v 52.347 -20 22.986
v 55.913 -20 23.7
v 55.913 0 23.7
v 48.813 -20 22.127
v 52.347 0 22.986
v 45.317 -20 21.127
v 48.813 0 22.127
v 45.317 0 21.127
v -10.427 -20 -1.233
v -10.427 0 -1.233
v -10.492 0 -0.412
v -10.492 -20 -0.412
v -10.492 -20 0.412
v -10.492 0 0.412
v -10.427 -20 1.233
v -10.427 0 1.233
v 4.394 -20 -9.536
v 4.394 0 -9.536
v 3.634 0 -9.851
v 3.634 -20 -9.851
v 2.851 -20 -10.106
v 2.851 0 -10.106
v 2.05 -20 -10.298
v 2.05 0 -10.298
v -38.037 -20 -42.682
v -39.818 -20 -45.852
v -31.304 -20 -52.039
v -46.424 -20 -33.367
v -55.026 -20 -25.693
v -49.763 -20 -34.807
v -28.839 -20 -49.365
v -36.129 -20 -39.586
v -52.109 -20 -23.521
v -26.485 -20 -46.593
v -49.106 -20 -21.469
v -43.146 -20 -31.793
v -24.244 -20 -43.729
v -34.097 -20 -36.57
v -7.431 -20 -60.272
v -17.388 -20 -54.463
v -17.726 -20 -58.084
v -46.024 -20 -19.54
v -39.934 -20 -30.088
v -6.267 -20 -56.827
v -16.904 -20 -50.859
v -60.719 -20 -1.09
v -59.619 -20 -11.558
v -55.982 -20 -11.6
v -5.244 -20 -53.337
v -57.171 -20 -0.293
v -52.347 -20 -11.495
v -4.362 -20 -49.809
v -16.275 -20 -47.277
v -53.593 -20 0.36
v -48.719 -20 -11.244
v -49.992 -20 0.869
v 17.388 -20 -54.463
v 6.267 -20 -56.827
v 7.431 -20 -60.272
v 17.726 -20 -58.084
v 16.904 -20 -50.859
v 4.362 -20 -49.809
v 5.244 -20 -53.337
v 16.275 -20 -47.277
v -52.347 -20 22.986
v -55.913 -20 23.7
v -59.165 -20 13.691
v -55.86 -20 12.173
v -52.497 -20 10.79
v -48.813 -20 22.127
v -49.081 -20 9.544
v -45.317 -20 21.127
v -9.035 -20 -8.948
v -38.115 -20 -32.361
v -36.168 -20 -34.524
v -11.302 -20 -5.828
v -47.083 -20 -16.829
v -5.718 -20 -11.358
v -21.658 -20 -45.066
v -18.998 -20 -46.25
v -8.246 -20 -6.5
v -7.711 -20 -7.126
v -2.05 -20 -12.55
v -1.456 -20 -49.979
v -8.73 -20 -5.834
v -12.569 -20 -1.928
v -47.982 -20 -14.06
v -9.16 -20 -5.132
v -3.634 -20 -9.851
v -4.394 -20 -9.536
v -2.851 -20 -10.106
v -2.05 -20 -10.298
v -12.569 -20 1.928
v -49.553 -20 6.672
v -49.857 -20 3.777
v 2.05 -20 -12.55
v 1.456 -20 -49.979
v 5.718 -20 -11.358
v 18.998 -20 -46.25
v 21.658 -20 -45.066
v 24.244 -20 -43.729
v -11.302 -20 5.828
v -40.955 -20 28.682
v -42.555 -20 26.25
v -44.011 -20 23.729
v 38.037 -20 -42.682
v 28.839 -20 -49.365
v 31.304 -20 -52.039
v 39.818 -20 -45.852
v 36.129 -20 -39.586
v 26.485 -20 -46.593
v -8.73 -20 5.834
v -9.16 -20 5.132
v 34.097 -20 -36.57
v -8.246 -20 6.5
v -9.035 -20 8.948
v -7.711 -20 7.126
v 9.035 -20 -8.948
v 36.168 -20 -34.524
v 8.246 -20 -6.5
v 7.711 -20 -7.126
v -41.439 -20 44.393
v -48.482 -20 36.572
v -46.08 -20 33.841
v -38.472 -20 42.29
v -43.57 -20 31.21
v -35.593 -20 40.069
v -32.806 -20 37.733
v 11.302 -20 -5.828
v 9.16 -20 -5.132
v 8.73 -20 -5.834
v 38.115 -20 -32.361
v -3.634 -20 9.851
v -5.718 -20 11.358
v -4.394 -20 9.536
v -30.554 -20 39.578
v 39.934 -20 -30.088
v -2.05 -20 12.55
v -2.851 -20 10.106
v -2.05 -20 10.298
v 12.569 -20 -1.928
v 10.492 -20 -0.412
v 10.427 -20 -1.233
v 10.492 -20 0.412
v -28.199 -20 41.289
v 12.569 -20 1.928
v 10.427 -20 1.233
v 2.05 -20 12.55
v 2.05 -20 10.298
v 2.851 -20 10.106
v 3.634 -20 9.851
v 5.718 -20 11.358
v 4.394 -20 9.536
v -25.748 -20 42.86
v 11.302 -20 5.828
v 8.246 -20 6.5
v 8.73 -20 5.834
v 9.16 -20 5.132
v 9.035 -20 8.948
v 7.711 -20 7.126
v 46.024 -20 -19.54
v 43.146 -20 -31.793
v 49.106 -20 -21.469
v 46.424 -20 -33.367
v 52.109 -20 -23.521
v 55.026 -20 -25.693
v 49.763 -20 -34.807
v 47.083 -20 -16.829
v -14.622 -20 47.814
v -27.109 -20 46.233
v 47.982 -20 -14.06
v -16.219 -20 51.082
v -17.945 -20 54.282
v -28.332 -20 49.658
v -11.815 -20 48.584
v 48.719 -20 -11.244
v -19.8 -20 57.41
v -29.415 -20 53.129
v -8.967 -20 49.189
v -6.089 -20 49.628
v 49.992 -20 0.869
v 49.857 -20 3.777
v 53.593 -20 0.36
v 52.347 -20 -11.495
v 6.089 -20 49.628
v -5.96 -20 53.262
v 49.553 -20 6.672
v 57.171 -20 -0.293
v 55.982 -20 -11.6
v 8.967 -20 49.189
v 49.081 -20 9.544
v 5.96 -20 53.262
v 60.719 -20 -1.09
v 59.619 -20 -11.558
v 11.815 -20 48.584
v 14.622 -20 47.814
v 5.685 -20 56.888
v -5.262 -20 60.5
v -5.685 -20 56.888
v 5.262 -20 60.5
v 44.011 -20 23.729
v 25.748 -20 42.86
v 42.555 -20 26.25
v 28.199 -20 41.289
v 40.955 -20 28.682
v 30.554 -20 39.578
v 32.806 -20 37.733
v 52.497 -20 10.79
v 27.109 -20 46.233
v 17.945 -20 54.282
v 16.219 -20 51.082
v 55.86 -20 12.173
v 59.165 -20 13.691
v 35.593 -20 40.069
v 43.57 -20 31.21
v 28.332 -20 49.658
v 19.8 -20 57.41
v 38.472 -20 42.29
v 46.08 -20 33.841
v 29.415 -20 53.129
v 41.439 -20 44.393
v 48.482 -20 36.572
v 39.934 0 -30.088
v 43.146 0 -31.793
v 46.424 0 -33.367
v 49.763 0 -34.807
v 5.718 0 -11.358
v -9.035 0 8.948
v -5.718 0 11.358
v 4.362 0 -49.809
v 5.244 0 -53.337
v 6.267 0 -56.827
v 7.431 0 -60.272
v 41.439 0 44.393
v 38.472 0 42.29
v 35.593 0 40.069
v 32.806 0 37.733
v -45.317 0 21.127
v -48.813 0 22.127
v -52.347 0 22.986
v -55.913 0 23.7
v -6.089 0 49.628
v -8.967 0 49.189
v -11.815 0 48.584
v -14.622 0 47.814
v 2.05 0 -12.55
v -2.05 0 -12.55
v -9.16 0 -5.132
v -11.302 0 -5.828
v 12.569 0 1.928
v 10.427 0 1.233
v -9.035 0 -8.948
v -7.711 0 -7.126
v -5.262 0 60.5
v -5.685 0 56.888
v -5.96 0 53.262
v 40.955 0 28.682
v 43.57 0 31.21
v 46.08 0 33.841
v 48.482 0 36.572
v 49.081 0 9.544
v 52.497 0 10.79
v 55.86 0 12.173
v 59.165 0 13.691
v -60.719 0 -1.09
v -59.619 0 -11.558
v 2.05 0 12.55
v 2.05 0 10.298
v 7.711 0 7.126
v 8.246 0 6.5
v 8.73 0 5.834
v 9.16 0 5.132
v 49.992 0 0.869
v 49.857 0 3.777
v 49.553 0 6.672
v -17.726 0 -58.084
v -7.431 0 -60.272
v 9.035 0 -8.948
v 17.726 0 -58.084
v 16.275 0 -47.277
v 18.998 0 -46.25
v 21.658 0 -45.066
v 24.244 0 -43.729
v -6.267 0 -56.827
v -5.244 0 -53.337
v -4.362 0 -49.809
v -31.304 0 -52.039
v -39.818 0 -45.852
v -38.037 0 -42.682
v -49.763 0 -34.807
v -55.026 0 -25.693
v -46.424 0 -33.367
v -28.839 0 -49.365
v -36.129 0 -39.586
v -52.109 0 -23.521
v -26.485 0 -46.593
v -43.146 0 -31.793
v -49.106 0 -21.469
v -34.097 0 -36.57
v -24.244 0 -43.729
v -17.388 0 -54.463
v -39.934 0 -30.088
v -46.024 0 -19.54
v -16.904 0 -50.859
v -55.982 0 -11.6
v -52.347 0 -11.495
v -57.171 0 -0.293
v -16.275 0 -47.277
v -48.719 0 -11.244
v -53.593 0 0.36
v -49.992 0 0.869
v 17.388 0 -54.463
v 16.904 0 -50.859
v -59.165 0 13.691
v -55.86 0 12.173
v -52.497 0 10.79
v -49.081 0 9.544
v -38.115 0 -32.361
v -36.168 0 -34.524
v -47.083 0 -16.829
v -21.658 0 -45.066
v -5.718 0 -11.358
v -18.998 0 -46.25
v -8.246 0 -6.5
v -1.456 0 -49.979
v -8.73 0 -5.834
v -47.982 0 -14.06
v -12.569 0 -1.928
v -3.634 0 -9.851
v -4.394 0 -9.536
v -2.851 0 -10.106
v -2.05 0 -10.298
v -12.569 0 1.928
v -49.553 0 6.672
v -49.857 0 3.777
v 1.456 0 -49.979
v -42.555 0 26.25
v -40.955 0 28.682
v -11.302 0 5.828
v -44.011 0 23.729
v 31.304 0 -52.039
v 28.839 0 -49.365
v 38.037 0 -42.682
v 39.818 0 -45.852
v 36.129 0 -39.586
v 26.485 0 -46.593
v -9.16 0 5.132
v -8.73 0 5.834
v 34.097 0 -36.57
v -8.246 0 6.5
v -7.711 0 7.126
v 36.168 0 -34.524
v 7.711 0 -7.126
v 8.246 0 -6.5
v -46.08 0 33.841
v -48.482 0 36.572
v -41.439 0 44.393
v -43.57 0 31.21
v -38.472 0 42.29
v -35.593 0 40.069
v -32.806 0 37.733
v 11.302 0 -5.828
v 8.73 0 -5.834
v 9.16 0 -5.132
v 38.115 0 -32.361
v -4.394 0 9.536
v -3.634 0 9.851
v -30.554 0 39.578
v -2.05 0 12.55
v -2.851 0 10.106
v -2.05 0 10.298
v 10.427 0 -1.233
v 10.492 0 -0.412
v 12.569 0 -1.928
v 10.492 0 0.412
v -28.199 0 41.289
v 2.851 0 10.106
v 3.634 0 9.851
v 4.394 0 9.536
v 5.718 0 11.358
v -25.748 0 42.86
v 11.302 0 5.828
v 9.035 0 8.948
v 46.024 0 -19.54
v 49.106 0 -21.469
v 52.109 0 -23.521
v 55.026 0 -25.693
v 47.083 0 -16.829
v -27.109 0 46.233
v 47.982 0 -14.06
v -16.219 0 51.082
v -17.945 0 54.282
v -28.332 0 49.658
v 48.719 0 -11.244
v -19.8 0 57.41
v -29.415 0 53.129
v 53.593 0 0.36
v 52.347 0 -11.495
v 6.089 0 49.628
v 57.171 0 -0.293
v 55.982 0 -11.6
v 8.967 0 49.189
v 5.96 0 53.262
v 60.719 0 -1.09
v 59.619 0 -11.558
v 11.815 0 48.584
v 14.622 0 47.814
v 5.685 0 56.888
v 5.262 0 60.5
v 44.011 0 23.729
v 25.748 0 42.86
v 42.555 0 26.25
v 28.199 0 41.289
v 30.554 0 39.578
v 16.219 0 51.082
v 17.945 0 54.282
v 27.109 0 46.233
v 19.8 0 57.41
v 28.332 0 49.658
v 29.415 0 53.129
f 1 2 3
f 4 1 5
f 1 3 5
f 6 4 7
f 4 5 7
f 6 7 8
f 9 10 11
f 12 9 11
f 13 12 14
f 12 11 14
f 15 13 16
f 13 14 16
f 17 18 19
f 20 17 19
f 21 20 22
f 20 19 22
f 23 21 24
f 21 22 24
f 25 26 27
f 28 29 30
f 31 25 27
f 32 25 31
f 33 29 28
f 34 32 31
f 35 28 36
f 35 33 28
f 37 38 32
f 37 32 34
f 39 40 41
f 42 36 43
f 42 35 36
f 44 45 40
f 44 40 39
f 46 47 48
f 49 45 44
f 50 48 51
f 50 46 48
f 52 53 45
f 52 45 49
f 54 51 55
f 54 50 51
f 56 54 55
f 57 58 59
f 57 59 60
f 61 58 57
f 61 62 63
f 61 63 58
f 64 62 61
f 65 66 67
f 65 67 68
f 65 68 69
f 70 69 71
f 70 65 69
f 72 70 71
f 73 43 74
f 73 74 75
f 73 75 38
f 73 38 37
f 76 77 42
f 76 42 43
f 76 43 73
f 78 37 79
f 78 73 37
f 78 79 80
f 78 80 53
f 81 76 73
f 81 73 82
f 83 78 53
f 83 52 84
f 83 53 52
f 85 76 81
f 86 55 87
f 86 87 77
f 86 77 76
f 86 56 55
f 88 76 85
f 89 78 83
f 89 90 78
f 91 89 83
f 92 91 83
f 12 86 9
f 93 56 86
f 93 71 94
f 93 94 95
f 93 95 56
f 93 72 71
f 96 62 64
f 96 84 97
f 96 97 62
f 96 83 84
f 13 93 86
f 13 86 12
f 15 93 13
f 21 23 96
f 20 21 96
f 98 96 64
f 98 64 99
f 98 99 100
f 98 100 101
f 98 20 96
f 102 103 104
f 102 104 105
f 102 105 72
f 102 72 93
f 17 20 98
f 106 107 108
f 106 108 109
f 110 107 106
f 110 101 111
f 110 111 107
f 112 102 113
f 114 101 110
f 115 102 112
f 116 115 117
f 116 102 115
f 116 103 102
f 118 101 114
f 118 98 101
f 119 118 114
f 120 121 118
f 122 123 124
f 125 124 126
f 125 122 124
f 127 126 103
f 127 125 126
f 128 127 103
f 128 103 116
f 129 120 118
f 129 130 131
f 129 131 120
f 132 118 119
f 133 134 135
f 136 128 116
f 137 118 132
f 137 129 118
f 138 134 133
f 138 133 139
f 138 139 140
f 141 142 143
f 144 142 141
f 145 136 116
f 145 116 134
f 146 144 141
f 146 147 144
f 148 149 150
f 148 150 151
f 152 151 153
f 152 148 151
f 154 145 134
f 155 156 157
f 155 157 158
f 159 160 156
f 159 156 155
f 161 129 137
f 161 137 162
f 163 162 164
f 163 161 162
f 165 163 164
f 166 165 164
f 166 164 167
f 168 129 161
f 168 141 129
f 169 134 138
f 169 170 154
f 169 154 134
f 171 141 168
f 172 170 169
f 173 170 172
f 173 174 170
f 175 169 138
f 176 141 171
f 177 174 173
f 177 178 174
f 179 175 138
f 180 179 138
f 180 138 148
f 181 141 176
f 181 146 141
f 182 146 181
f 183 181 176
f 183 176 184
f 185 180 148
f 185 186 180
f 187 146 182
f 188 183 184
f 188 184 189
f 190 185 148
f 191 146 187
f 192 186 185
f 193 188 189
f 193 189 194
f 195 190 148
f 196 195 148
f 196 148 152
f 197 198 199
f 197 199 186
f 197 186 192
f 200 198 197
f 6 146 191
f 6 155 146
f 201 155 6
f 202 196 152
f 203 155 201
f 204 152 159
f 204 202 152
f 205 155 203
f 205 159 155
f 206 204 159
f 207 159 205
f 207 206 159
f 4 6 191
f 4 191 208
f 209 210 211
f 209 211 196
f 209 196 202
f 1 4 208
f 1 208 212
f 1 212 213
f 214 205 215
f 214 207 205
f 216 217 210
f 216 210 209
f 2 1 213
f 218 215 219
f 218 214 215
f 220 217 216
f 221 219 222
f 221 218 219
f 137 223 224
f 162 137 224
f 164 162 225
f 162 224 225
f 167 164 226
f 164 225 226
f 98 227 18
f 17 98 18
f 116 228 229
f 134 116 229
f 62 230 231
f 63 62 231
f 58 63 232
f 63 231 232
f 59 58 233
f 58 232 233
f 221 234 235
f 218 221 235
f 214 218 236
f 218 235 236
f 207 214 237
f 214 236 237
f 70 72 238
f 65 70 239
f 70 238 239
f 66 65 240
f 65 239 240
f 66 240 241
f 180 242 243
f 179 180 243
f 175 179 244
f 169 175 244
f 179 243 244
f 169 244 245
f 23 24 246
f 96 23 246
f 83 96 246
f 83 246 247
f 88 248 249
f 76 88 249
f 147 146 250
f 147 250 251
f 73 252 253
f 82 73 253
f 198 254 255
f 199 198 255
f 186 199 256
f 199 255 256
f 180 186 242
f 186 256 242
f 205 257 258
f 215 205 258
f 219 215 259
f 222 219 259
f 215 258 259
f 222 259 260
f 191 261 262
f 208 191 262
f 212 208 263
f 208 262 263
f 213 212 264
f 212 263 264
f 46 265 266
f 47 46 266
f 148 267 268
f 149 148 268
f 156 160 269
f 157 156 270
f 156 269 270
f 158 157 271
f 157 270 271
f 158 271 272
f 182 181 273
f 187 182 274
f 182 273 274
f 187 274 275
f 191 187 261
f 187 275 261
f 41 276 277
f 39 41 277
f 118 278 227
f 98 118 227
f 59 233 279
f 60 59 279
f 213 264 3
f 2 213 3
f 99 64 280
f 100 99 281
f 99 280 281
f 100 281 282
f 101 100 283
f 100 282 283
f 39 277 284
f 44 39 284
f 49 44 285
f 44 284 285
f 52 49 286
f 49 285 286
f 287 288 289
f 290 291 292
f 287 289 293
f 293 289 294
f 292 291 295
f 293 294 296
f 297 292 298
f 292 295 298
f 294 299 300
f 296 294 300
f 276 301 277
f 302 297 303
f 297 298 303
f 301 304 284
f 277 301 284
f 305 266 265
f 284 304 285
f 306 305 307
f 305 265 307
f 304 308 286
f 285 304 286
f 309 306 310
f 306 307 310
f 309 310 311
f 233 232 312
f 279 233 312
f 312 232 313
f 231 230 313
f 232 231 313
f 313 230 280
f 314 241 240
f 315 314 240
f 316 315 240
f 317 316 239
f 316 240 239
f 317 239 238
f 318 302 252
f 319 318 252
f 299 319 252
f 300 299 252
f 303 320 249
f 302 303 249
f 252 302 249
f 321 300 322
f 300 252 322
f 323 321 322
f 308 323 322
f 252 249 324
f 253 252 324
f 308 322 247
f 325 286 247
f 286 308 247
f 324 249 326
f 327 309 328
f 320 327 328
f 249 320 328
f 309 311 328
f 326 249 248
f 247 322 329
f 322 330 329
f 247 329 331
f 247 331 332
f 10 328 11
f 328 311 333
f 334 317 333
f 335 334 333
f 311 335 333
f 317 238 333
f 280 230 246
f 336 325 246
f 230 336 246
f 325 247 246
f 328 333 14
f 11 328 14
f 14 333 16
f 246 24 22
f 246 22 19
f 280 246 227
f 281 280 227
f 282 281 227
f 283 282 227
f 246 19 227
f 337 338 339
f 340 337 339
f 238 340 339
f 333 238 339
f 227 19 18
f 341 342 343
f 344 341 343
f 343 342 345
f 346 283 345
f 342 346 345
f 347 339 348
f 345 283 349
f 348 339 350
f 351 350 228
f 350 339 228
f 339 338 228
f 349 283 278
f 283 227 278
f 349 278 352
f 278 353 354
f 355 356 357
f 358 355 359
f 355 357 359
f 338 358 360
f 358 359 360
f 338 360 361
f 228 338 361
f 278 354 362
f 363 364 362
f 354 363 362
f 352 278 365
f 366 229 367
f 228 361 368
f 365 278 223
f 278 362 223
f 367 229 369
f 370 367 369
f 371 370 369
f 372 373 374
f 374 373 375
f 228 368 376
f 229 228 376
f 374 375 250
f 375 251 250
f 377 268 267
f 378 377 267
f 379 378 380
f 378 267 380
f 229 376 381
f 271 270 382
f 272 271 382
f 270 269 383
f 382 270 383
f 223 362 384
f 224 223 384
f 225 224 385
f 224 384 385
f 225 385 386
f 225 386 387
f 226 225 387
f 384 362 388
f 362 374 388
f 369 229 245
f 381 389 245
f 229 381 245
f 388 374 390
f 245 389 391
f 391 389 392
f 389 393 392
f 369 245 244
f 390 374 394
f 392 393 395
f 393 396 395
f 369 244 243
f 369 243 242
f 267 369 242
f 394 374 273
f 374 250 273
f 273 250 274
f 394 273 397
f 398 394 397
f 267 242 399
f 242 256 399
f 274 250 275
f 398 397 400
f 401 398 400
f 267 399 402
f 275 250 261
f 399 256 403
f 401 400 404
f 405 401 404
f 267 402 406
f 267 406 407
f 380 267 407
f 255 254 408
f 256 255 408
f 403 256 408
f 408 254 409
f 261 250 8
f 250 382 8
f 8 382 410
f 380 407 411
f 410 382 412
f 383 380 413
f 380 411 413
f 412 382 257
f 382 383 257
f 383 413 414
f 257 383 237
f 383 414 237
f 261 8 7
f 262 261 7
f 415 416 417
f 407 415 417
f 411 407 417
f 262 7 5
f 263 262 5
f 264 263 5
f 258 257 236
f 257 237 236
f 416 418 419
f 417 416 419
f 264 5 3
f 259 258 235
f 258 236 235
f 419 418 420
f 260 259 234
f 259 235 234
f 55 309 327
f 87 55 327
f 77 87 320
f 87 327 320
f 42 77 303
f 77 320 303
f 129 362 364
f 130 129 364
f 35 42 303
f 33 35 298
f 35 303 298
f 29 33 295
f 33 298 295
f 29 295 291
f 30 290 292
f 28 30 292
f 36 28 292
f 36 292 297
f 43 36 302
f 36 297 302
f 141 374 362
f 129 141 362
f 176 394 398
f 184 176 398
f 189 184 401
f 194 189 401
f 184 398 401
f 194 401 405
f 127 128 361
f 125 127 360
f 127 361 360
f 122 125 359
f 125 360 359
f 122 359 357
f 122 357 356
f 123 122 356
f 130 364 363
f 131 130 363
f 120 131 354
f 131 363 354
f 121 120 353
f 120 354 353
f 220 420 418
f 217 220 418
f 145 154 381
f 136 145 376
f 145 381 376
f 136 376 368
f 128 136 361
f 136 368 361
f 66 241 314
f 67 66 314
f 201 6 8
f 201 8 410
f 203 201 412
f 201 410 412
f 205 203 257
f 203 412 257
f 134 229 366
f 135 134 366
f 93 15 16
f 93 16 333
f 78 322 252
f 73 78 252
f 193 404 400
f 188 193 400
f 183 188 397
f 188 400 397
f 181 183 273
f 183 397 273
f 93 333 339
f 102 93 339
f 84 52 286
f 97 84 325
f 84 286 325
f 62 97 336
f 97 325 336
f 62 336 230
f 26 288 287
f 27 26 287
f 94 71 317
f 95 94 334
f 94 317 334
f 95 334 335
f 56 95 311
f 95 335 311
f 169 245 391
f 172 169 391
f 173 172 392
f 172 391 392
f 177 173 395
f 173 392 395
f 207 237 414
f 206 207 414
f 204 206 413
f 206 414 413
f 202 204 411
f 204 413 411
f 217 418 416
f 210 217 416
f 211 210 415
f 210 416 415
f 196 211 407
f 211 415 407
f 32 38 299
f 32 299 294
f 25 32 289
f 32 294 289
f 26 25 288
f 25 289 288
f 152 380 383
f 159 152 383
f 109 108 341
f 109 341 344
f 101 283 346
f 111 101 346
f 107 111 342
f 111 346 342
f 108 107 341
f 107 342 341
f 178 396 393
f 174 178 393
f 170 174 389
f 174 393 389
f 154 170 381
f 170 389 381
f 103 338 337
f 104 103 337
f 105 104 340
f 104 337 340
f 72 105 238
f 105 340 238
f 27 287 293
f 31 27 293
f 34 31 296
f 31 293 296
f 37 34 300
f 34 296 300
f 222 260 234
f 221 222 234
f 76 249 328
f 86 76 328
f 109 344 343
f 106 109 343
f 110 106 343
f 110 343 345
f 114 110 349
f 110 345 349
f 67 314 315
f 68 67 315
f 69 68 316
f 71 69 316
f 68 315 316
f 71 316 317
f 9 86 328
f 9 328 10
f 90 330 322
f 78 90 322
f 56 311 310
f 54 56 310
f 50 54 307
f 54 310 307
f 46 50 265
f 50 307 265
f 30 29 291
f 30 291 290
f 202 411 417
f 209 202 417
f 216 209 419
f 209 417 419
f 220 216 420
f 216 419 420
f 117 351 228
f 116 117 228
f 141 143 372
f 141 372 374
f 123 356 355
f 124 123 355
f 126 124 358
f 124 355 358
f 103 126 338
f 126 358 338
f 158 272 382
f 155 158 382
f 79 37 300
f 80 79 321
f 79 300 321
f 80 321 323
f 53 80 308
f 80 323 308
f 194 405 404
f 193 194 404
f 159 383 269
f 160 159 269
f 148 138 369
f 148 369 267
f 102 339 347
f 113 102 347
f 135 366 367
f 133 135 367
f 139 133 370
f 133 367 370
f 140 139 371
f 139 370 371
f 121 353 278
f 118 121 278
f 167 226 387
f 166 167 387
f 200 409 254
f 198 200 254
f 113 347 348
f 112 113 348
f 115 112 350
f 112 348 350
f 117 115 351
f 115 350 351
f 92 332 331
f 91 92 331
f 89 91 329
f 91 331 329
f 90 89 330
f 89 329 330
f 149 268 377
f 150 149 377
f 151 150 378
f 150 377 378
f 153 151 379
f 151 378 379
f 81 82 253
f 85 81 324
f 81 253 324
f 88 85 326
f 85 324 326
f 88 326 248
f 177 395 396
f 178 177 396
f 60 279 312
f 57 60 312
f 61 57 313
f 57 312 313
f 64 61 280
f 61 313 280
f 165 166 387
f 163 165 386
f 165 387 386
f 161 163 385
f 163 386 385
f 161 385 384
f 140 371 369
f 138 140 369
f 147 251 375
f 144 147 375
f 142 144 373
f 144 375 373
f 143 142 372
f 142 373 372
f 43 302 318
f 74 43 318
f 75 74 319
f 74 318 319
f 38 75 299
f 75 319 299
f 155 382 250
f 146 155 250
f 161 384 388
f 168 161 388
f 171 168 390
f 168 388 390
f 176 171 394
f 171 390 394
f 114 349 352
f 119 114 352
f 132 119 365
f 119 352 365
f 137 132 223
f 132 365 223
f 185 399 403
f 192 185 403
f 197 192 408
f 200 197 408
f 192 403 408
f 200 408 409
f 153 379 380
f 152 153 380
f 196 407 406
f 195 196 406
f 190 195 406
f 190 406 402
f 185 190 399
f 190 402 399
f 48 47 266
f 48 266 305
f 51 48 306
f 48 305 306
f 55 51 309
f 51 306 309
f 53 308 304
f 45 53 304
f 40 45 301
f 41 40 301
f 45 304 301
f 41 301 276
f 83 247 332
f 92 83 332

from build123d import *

# Parameters (mm, degrees)
F1_DEPTH = 20


with BuildPart() as f1:
    # F0 (on Front) → F1 (new body)
    with BuildSketch(Plane.XZ):
        with BuildLine():
            ThreePointArc((-48.48151, 36.57166), (-44.837984, 32.512816), (-40.955282, 28.682135))
            ThreePointArc((-40.955282, 28.682135), (-43.30127, 25), (-45.317098, 21.127248))
            ThreePointArc((-45.317098, 21.127248), (-50.575917, 22.574425), (-55.912741, 23.700389))
            Line((-55.912741, 23.700389), (-59.165097, 13.690667))
            ThreePointArc((-59.165097, 13.690667), (-54.18569, 11.464684), (-49.080587, 9.54442))
            ThreePointArc((-49.080587, 9.54442), (-49.726095, 5.226423), (-49.992455, 0.868577))
            ThreePointArc((-49.992455, 0.868577), (-55.385245, 0.051685), (-60.718648, -1.090378))
            Line((-60.718648, -1.090378), (-59.618502, -11.557566))
            ThreePointArc((-59.618502, -11.557566), (-54.164198, -11.565795), (-48.719413, -11.243612))
            ThreePointArc((-48.719413, -11.243612), (-47.552826, -15.45085), (-46.023662, -19.540279))
            ThreePointArc((-46.023662, -19.540279), (-50.617961, -22.479992), (-55.025748, -25.692609))
            Line((-55.025748, -25.692609), (-49.763326, -34.807391))
            ThreePointArc((-49.763326, -34.807391), (-44.777225, -32.596444), (-39.934209, -30.087521))
            ThreePointArc((-39.934209, -30.087521), (-37.157241, -33.45653), (-34.09696, -36.570443))
            ThreePointArc((-34.09696, -36.570443), (-37.098372, -41.124674), (-39.818397, -45.852354))
            Line((-39.818397, -45.852354), (-31.303619, -52.038702))
            ThreePointArc((-31.303619, -52.038702), (-27.647862, -47.990872), (-24.244018, -43.729025))
            ThreePointArc((-24.244018, -43.729025), (-20.336832, -45.677273), (-16.274584, -47.277245))
            ThreePointArc((-16.274584, -47.277245), (-17.164137, -52.658526), (-17.726083, -58.083811))
            Line((-17.726083, -58.083811), (-7.431232, -60.272049))
            ThreePointArc((-7.431232, -60.272049), (-5.737933, -55.087241), (-4.361816, -49.809382))
            ThreePointArc((-4.361816, -49.809382), (0, -50), (4.361816, -49.809382))
            ThreePointArc((4.361816, -49.809382), (5.737933, -55.087241), (7.431232, -60.272049))
            Line((7.431232, -60.272049), (17.726083, -58.083811))
            ThreePointArc((17.726083, -58.083811), (17.164137, -52.658526), (16.274584, -47.277245))
            ThreePointArc((16.274584, -47.277245), (20.336832, -45.677273), (24.244018, -43.729025))
            ThreePointArc((24.244018, -43.729025), (27.647862, -47.990872), (31.303619, -52.038702))
            Line((31.303619, -52.038702), (39.818397, -45.852354))
            ThreePointArc((39.818397, -45.852354), (37.098372, -41.124674), (34.09696, -36.570443))
            ThreePointArc((34.09696, -36.570443), (37.157241, -33.45653), (39.934209, -30.087521))
            ThreePointArc((39.934209, -30.087521), (44.777225, -32.596444), (49.763326, -34.807391))
            Line((49.763326, -34.807391), (55.025748, -25.692609))
            ThreePointArc((55.025748, -25.692609), (50.617961, -22.479992), (46.023662, -19.540279))
            ThreePointArc((46.023662, -19.540279), (47.552826, -15.45085), (48.719413, -11.243612))
            ThreePointArc((48.719413, -11.243612), (54.164198, -11.565795), (59.618502, -11.557566))
            Line((59.618502, -11.557566), (60.718648, -1.090378))
            ThreePointArc((60.718648, -1.090378), (55.385245, 0.051685), (49.992455, 0.868577))
            ThreePointArc((49.992455, 0.868577), (49.726095, 5.226423), (49.080587, 9.54442))
            ThreePointArc((49.080587, 9.54442), (54.18569, 11.464684), (59.165097, 13.690667))
            Line((59.165097, 13.690667), (55.912741, 23.700389))
            ThreePointArc((55.912741, 23.700389), (50.575917, 22.574425), (45.317098, 21.127248))
            ThreePointArc((45.317098, 21.127248), (43.30127, 25), (40.955282, 28.682135))
            ThreePointArc((40.955282, 28.682135), (44.837984, 32.512816), (48.48151, 36.57166))
            Line((48.48151, 36.57166), (41.439014, 44.393143))
            ThreePointArc((41.439014, 44.393143), (37.021553, 41.193842), (32.806004, 37.732826))
            ThreePointArc((32.806004, 37.732826), (29.389263, 40.45085), (25.748437, 42.860448))
            ThreePointArc((25.748437, 42.860448), (27.737383, 47.939187), (29.415029, 53.12908))
            Line((29.415029, 53.12908), (19.800105, 57.40992))
            ThreePointArc((19.800105, 57.40992), (17.065827, 52.69047), (14.622453, 47.814055))
            ThreePointArc((14.622453, 47.814055), (10.395585, 48.90738), (6.089453, 49.6278))
            ThreePointArc((6.089453, 49.6278), (5.840736, 55.076436), (5.262422, 60.5))
            Line((5.262422, 60.5), (-5.262422, 60.5))
            ThreePointArc((-5.262422, 60.5), (-5.840736, 55.076436), (-6.089453, 49.6278))
            ThreePointArc((-6.089453, 49.6278), (-10.395585, 48.90738), (-14.622453, 47.814055))
            ThreePointArc((-14.622453, 47.814055), (-17.065827, 52.69047), (-19.800105, 57.40992))
            Line((-19.800105, 57.40992), (-29.415029, 53.12908))
            ThreePointArc((-29.415029, 53.12908), (-27.737383, 47.939187), (-25.748437, 42.860448))
            ThreePointArc((-25.748437, 42.860448), (-29.389263, 40.45085), (-32.806004, 37.732826))
            ThreePointArc((-32.806004, 37.732826), (-37.021553, 41.193842), (-41.439014, 44.393143))
            Line((-41.439014, 44.393143), (-48.48151, 36.57166))
        make_face()
        with BuildLine():
            ThreePointArc((-2.05, -10.297937), (-3.244678, -9.986093), (-4.39449, -9.536166))
            Line((-4.39449, -9.536166), (-5.71822, -11.358123))
            Line((-5.71822, -11.358123), (-9.03519, -8.948204))
            Line((-9.03519, -8.948204), (-7.71146, -7.126246))
            ThreePointArc((-7.71146, -7.126246), (-8.494678, -6.171745), (-9.160435, -5.131903))
            Line((-9.160435, -5.131903), (-11.302274, -5.827829))
            Line((-11.302274, -5.827829), (-12.569244, -1.928497))
            Line((-12.569244, -1.928497), (-10.427405, -1.232572))
            ThreePointArc((-10.427405, -1.232572), (-10.5, 0), (-10.427405, 1.232572))
            Line((-10.427405, 1.232572), (-12.569244, 1.928497))
            Line((-12.569244, 1.928497), (-11.302274, 5.827829))
            Line((-11.302274, 5.827829), (-9.160435, 5.131903))
            ThreePointArc((-9.160435, 5.131903), (-8.494678, 6.171745), (-7.71146, 7.126246))
            Line((-7.71146, 7.126246), (-9.03519, 8.948204))
            Line((-9.03519, 8.948204), (-5.71822, 11.358123))
            Line((-5.71822, 11.358123), (-4.39449, 9.536166))
            ThreePointArc((-4.39449, 9.536166), (-3.244678, 9.986093), (-2.05, 10.297937))
            Line((-2.05, 10.297937), (-2.05, 12.55))
            Line((-2.05, 12.55), (2.05, 12.55))
            Line((2.05, 12.55), (2.05, 10.297937))
            ThreePointArc((2.05, 10.297937), (3.244678, 9.986093), (4.39449, 9.536166))
            Line((4.39449, 9.536166), (5.71822, 11.358123))
            Line((5.71822, 11.358123), (9.03519, 8.948204))
            Line((9.03519, 8.948204), (7.71146, 7.126246))
            ThreePointArc((7.71146, 7.126246), (8.494678, 6.171745), (9.160435, 5.131903))
            Line((9.160435, 5.131903), (11.302274, 5.827829))
            Line((11.302274, 5.827829), (12.569244, 1.928497))
            Line((12.569244, 1.928497), (10.427405, 1.232572))
            ThreePointArc((10.427405, 1.232572), (10.5, 0), (10.427405, -1.232572))
            Line((10.427405, -1.232572), (12.569244, -1.928497))
            Line((12.569244, -1.928497), (11.302274, -5.827829))
            Line((11.302274, -5.827829), (9.160435, -5.131903))
            ThreePointArc((9.160435, -5.131903), (8.494678, -6.171745), (7.71146, -7.126246))
            Line((7.71146, -7.126246), (9.03519, -8.948204))
            Line((9.03519, -8.948204), (5.71822, -11.358123))
            Line((5.71822, -11.358123), (4.39449, -9.536166))
            ThreePointArc((4.39449, -9.536166), (3.244678, -9.986093), (2.05, -10.297937))
            Line((2.05, -10.297937), (2.05, -12.55))
            Line((2.05, -12.55), (-2.05, -12.55))
            Line((-2.05, -12.55), (-2.05, -10.297937))
        make_face(mode=Mode.SUBTRACT)
    extrude(amount=F1_DEPTH)


solid = f1.part
